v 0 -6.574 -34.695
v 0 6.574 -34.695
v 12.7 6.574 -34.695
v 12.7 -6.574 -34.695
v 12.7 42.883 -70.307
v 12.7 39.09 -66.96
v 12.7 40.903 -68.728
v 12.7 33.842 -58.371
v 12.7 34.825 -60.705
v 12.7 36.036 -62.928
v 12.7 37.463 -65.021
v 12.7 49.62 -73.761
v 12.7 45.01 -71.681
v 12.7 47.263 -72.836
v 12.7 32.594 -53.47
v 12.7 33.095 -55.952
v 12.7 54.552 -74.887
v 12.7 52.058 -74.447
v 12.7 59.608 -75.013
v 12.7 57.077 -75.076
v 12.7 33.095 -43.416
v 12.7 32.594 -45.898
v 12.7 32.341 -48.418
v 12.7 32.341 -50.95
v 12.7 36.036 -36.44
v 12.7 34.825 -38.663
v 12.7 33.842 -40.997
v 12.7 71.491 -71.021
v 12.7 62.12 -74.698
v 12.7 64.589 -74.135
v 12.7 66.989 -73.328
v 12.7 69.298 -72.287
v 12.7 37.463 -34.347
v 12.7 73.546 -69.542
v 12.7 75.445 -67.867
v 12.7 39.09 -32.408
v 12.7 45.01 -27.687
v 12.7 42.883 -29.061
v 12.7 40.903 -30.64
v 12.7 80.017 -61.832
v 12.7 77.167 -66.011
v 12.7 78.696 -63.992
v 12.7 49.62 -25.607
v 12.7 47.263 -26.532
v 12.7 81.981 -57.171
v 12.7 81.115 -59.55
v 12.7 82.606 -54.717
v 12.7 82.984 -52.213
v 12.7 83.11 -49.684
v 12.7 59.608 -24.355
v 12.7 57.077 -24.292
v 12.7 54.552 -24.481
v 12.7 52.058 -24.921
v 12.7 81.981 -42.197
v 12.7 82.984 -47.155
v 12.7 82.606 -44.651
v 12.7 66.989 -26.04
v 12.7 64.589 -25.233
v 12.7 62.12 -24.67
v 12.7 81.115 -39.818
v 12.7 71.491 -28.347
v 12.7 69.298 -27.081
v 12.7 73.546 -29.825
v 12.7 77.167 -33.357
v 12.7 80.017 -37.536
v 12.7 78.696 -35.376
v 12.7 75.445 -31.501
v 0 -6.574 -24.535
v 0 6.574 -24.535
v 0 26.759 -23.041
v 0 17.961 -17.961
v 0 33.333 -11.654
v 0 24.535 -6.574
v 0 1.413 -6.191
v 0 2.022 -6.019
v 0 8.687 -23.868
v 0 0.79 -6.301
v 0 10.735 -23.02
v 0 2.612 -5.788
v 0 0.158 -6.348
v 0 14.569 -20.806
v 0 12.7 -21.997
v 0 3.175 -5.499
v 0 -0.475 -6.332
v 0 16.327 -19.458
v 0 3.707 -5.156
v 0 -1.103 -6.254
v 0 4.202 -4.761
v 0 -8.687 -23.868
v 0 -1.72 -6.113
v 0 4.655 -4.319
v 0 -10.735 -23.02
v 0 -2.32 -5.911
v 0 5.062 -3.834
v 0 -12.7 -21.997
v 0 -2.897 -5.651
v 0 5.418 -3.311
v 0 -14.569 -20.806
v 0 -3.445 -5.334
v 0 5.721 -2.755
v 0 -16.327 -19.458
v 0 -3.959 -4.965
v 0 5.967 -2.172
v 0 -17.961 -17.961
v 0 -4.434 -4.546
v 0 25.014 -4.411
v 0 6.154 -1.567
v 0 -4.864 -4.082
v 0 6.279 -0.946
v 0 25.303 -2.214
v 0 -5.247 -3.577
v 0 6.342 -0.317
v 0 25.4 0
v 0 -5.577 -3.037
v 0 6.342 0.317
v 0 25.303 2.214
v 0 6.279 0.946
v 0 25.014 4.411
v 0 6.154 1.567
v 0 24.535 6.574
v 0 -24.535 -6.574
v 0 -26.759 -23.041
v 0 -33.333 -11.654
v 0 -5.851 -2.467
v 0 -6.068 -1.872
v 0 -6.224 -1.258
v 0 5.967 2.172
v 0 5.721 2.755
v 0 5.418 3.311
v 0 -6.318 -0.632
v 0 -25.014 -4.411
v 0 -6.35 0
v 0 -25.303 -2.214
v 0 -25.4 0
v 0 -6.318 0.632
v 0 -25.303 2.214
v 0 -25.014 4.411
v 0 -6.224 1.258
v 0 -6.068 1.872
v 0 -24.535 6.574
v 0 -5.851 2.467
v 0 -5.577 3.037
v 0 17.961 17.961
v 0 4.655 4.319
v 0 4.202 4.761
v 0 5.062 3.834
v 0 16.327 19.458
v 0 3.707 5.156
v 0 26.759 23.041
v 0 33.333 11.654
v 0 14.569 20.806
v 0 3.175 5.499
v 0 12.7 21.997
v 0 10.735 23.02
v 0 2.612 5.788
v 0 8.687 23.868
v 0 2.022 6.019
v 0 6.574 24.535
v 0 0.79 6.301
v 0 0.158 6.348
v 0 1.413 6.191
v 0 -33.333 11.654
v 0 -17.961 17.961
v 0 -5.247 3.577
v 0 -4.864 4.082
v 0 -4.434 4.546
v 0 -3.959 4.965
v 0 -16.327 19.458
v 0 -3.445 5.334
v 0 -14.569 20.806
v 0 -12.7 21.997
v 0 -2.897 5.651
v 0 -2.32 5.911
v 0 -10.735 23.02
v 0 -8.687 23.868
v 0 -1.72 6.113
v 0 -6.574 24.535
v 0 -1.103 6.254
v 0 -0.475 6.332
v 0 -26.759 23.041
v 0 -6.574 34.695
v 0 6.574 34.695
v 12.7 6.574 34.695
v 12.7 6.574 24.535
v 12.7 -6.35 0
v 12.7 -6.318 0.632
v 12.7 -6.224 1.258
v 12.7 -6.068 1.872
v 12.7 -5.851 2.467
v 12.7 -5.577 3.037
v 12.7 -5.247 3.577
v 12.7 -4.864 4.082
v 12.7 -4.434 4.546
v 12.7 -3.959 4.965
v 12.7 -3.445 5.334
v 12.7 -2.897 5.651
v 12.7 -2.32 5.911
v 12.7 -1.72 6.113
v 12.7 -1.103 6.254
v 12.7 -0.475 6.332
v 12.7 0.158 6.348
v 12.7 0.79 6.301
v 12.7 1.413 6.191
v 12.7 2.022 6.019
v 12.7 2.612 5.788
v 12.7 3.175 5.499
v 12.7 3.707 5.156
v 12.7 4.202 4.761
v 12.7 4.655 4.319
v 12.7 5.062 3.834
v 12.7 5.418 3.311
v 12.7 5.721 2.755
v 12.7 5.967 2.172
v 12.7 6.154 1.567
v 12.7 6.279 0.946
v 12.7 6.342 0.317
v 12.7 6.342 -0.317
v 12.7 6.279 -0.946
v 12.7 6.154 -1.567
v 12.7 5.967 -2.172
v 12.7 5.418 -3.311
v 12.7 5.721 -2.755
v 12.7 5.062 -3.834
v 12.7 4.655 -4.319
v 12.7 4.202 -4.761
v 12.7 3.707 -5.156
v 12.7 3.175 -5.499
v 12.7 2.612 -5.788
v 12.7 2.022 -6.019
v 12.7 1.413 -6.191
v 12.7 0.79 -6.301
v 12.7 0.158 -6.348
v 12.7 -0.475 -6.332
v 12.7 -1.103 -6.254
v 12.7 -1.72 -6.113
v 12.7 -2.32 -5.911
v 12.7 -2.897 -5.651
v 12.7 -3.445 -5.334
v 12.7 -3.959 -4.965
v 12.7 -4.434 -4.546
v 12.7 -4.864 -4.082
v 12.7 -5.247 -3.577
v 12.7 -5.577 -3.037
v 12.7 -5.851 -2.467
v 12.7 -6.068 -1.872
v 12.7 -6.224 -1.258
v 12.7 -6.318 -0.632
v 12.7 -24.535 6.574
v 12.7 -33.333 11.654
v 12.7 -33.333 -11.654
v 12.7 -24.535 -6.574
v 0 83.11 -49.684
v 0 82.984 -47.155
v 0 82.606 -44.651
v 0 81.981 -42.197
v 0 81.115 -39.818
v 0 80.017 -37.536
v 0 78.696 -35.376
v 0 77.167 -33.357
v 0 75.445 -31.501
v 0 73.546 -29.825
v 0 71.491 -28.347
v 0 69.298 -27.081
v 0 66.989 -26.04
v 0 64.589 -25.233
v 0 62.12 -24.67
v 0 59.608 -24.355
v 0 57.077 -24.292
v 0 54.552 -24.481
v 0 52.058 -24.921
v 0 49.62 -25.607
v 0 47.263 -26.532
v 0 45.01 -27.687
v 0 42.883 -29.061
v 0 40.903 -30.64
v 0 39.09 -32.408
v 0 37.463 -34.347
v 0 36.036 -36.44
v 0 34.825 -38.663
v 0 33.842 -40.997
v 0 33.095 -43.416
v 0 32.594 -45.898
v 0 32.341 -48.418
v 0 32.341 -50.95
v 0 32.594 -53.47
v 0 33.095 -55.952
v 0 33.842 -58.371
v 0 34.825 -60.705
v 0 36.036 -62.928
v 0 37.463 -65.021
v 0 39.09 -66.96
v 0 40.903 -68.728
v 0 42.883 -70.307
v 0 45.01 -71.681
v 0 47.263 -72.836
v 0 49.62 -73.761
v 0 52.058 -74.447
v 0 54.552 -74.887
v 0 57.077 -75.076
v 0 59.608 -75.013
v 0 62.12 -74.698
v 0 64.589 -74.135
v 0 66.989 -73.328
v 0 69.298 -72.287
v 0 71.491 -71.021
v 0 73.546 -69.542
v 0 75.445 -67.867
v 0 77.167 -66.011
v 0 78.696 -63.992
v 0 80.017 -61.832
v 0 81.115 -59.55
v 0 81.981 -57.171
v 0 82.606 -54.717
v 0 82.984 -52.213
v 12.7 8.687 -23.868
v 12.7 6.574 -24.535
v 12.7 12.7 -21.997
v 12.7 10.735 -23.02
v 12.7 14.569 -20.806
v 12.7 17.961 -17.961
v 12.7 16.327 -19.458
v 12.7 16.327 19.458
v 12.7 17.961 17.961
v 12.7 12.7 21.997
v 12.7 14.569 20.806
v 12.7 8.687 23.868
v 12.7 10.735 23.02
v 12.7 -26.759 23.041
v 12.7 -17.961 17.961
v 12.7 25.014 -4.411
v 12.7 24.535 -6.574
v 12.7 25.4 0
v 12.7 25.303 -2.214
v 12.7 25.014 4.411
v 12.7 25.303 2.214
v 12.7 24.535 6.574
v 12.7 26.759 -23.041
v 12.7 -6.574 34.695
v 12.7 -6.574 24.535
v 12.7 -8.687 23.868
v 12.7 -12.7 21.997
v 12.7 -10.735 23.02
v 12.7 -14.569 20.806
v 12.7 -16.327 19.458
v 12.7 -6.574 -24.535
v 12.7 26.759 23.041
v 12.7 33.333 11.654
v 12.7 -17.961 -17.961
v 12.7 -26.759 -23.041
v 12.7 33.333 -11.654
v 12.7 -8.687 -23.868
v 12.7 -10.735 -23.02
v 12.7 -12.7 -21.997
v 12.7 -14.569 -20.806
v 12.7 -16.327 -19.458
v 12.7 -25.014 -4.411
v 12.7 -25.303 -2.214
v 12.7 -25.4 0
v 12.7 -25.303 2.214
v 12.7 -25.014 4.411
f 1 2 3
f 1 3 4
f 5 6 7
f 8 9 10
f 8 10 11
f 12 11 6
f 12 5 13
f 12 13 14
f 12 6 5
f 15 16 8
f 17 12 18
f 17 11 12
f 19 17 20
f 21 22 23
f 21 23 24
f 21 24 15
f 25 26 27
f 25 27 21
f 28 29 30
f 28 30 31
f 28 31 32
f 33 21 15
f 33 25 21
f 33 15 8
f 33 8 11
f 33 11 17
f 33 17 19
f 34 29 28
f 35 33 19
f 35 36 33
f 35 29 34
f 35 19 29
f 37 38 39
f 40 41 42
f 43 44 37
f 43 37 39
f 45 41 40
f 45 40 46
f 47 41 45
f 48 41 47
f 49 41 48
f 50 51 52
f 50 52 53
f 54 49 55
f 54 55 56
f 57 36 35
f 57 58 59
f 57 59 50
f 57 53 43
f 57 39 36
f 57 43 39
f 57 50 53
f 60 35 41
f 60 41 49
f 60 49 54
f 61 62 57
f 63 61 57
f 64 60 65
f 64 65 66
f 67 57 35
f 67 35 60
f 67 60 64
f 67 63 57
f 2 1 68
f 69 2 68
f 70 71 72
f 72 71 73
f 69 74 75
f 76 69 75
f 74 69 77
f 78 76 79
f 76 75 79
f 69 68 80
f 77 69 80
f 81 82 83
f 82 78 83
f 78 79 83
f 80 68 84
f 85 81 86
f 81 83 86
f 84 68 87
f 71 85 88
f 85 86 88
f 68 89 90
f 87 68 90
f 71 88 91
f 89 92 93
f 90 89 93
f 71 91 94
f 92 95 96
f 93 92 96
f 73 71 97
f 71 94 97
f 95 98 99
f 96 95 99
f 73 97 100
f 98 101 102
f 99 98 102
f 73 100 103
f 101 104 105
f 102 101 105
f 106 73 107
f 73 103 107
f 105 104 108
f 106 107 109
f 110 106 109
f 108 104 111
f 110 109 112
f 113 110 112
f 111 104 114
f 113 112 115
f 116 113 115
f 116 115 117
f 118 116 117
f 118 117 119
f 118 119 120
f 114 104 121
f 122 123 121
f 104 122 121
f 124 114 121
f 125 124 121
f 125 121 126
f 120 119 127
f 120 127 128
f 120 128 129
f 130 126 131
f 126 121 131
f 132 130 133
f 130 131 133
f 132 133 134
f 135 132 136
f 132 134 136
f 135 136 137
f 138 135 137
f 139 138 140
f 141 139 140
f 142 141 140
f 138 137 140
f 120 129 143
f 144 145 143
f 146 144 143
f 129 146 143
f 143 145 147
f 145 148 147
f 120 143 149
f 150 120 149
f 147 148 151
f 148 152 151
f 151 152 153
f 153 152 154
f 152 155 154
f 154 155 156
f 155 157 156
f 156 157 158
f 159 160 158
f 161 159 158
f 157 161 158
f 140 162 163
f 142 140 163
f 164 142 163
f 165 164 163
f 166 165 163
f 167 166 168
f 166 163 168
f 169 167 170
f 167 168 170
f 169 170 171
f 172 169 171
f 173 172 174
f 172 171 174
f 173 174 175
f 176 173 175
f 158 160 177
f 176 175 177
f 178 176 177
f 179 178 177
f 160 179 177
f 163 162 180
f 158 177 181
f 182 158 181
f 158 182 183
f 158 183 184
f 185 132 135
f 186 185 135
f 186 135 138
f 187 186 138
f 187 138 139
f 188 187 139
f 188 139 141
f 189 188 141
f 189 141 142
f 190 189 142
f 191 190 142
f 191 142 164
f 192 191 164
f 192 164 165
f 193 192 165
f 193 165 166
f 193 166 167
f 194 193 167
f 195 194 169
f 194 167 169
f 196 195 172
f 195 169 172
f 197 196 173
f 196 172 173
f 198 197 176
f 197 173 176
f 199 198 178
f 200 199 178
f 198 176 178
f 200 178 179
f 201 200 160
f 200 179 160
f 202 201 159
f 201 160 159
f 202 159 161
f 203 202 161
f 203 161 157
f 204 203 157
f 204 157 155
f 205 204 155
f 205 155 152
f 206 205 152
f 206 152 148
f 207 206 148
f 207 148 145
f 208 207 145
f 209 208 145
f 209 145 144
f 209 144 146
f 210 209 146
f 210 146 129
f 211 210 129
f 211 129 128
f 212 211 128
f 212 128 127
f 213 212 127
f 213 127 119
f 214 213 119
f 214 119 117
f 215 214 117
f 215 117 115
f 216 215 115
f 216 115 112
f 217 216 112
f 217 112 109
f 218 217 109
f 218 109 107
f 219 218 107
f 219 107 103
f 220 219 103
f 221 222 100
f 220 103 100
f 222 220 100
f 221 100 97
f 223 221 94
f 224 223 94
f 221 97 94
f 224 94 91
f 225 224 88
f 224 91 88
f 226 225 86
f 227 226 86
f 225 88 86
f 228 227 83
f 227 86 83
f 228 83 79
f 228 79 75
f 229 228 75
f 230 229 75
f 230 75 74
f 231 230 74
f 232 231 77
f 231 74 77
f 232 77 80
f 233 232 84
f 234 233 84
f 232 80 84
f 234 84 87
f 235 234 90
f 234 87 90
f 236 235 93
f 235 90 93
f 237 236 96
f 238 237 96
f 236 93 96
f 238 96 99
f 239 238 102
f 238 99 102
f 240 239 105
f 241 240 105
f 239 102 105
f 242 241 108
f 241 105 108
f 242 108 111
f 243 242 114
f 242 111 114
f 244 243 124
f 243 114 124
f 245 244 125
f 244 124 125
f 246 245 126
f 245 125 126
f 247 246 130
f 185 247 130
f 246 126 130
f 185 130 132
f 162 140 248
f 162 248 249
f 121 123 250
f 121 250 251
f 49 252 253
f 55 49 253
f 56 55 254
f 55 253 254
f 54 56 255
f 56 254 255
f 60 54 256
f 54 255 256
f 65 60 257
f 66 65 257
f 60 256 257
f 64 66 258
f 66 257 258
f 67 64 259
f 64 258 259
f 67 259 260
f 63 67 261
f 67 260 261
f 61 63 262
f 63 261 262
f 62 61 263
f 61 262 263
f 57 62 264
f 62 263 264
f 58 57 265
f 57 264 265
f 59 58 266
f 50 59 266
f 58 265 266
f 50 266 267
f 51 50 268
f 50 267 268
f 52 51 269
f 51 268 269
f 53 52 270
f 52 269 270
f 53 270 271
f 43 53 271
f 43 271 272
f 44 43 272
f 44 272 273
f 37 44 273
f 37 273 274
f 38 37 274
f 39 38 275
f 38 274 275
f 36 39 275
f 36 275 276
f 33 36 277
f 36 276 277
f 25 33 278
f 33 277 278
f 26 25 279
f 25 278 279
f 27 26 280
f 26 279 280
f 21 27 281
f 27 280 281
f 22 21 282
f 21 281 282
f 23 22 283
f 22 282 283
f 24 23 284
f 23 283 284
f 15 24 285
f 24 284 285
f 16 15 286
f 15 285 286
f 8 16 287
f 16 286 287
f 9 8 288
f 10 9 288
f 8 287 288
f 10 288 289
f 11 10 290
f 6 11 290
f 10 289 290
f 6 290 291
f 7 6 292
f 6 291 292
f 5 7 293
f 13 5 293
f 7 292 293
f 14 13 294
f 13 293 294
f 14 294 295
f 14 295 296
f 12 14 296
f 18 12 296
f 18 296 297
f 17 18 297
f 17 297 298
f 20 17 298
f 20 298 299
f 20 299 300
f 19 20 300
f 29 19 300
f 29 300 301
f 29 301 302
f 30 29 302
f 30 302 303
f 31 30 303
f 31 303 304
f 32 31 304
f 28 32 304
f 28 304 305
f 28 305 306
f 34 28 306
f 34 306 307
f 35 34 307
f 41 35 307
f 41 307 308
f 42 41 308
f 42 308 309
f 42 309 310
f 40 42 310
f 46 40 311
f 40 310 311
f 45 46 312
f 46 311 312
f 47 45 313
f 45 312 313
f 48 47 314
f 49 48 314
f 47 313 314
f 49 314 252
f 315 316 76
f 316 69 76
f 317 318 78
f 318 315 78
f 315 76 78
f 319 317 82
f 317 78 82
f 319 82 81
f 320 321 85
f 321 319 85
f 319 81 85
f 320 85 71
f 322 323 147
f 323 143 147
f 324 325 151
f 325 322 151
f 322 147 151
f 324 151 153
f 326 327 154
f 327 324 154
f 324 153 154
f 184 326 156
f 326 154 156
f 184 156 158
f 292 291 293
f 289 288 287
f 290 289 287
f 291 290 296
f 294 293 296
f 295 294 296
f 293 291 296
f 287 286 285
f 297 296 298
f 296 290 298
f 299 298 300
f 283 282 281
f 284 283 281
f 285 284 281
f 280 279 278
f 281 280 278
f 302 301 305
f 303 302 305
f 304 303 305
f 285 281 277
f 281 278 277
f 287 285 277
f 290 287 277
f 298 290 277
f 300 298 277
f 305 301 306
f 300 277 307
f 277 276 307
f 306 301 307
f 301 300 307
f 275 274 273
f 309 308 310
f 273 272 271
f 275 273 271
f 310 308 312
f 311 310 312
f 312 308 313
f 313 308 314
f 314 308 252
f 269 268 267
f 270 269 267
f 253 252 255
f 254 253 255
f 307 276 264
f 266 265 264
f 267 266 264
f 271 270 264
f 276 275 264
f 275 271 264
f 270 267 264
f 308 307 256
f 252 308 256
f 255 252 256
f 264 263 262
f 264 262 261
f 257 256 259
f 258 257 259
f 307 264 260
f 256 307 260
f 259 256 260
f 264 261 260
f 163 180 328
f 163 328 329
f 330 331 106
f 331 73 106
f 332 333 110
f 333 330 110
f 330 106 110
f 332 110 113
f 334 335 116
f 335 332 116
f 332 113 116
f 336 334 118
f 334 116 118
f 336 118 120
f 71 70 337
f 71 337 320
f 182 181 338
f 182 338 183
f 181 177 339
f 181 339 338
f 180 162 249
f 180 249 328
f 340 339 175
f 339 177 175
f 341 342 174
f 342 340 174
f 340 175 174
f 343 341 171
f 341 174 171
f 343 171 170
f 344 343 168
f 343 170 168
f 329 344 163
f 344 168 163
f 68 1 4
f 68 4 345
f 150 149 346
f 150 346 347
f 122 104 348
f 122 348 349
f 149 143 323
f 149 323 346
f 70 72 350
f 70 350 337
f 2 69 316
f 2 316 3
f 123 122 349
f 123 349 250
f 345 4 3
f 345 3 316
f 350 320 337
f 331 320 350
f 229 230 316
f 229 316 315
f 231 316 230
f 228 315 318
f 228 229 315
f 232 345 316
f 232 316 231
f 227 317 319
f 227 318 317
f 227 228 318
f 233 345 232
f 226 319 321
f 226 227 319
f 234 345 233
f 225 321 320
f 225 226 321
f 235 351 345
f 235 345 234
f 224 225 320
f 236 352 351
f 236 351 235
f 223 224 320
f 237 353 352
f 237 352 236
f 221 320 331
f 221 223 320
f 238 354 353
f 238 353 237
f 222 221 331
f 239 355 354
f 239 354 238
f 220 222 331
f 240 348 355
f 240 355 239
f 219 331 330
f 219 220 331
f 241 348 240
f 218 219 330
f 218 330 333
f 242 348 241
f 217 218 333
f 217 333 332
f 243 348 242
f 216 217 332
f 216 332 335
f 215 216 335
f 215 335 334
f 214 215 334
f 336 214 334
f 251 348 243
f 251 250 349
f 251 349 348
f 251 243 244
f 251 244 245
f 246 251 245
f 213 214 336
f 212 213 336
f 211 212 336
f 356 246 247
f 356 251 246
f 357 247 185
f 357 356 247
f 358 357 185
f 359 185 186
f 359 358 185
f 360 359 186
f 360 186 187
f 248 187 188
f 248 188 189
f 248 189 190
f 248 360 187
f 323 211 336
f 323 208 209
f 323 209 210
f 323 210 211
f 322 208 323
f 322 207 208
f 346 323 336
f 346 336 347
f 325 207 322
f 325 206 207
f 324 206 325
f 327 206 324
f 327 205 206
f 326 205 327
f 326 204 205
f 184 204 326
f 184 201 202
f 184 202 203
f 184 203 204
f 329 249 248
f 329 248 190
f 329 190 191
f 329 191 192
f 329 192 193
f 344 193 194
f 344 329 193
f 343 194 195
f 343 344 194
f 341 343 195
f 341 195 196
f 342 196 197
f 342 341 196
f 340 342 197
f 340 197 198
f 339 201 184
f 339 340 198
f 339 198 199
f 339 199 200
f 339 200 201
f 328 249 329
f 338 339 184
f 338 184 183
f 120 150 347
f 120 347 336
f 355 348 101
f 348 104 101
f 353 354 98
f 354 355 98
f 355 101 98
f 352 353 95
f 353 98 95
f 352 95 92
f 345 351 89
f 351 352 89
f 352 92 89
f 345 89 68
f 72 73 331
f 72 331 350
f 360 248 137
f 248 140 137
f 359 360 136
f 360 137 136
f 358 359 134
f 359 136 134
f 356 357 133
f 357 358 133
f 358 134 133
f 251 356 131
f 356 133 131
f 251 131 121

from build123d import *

# Parameters (mm, degrees)
F0_R     = 25.4
F1_DEPTH = 12.7
F3_DEPTH = 12.7
F5_COUNT = 6
F6_R     = 6.35
F7_DEPTH = 25.4
F8_R     = 25.4
F9_DEPTH = 12.7


with BuildPart() as f1:
    # F0 (on Right) → F1 (new body)
    with BuildSketch(Plane.YZ):
        Circle(F0_R)
    extrude(amount=F1_DEPTH)

    # F2 (on face) → F3 (join)
    with BuildSketch(Plane(origin=(0, 0, 0), x_dir=(0, -1, 0), z_dir=(-1, 0, 0))):
        Polygon((-6.574004, 24.534516), (0, 0), (0, 24.534516), align=None)
        Polygon((0, 24.534516), (0, 0), (6.574004, 24.534516), align=None)
        Polygon((-6.574004, 24.534516), (0, 24.534516), (6.574004, 24.534516), (6.574004, 34.694515), (-6.574004, 34.694515), align=None)
    extrude(amount=-F3_DEPTH)

    # F5: F1 ×6 about axis
    f5_axis = Axis((-28.345339, 0, 0), (-1, 0, 0))


with BuildPart() as f1_1:
    add(f1.part)
    for i in range(1, F5_COUNT):
        add(f1.part.rotate(f5_axis, i * 360 / F5_COUNT))

    # F6 (on face) → F7 (cut)
    with BuildSketch(Plane(origin=(0, 0, 0), x_dir=(0, -1, 0), z_dir=(-1, 0, 0))):
        Circle(F6_R)
    extrude(amount=-F7_DEPTH, mode=Mode.SUBTRACT)


with BuildPart() as f9:
    # F8 (on Right) → F9 (new body)
    with BuildSketch(Plane.YZ):
        with Locations((57.709835, -49.683958)):
            Circle(F8_R)
    extrude(amount=F9_DEPTH)


solid = Compound([f1_1.part, f9.part])
